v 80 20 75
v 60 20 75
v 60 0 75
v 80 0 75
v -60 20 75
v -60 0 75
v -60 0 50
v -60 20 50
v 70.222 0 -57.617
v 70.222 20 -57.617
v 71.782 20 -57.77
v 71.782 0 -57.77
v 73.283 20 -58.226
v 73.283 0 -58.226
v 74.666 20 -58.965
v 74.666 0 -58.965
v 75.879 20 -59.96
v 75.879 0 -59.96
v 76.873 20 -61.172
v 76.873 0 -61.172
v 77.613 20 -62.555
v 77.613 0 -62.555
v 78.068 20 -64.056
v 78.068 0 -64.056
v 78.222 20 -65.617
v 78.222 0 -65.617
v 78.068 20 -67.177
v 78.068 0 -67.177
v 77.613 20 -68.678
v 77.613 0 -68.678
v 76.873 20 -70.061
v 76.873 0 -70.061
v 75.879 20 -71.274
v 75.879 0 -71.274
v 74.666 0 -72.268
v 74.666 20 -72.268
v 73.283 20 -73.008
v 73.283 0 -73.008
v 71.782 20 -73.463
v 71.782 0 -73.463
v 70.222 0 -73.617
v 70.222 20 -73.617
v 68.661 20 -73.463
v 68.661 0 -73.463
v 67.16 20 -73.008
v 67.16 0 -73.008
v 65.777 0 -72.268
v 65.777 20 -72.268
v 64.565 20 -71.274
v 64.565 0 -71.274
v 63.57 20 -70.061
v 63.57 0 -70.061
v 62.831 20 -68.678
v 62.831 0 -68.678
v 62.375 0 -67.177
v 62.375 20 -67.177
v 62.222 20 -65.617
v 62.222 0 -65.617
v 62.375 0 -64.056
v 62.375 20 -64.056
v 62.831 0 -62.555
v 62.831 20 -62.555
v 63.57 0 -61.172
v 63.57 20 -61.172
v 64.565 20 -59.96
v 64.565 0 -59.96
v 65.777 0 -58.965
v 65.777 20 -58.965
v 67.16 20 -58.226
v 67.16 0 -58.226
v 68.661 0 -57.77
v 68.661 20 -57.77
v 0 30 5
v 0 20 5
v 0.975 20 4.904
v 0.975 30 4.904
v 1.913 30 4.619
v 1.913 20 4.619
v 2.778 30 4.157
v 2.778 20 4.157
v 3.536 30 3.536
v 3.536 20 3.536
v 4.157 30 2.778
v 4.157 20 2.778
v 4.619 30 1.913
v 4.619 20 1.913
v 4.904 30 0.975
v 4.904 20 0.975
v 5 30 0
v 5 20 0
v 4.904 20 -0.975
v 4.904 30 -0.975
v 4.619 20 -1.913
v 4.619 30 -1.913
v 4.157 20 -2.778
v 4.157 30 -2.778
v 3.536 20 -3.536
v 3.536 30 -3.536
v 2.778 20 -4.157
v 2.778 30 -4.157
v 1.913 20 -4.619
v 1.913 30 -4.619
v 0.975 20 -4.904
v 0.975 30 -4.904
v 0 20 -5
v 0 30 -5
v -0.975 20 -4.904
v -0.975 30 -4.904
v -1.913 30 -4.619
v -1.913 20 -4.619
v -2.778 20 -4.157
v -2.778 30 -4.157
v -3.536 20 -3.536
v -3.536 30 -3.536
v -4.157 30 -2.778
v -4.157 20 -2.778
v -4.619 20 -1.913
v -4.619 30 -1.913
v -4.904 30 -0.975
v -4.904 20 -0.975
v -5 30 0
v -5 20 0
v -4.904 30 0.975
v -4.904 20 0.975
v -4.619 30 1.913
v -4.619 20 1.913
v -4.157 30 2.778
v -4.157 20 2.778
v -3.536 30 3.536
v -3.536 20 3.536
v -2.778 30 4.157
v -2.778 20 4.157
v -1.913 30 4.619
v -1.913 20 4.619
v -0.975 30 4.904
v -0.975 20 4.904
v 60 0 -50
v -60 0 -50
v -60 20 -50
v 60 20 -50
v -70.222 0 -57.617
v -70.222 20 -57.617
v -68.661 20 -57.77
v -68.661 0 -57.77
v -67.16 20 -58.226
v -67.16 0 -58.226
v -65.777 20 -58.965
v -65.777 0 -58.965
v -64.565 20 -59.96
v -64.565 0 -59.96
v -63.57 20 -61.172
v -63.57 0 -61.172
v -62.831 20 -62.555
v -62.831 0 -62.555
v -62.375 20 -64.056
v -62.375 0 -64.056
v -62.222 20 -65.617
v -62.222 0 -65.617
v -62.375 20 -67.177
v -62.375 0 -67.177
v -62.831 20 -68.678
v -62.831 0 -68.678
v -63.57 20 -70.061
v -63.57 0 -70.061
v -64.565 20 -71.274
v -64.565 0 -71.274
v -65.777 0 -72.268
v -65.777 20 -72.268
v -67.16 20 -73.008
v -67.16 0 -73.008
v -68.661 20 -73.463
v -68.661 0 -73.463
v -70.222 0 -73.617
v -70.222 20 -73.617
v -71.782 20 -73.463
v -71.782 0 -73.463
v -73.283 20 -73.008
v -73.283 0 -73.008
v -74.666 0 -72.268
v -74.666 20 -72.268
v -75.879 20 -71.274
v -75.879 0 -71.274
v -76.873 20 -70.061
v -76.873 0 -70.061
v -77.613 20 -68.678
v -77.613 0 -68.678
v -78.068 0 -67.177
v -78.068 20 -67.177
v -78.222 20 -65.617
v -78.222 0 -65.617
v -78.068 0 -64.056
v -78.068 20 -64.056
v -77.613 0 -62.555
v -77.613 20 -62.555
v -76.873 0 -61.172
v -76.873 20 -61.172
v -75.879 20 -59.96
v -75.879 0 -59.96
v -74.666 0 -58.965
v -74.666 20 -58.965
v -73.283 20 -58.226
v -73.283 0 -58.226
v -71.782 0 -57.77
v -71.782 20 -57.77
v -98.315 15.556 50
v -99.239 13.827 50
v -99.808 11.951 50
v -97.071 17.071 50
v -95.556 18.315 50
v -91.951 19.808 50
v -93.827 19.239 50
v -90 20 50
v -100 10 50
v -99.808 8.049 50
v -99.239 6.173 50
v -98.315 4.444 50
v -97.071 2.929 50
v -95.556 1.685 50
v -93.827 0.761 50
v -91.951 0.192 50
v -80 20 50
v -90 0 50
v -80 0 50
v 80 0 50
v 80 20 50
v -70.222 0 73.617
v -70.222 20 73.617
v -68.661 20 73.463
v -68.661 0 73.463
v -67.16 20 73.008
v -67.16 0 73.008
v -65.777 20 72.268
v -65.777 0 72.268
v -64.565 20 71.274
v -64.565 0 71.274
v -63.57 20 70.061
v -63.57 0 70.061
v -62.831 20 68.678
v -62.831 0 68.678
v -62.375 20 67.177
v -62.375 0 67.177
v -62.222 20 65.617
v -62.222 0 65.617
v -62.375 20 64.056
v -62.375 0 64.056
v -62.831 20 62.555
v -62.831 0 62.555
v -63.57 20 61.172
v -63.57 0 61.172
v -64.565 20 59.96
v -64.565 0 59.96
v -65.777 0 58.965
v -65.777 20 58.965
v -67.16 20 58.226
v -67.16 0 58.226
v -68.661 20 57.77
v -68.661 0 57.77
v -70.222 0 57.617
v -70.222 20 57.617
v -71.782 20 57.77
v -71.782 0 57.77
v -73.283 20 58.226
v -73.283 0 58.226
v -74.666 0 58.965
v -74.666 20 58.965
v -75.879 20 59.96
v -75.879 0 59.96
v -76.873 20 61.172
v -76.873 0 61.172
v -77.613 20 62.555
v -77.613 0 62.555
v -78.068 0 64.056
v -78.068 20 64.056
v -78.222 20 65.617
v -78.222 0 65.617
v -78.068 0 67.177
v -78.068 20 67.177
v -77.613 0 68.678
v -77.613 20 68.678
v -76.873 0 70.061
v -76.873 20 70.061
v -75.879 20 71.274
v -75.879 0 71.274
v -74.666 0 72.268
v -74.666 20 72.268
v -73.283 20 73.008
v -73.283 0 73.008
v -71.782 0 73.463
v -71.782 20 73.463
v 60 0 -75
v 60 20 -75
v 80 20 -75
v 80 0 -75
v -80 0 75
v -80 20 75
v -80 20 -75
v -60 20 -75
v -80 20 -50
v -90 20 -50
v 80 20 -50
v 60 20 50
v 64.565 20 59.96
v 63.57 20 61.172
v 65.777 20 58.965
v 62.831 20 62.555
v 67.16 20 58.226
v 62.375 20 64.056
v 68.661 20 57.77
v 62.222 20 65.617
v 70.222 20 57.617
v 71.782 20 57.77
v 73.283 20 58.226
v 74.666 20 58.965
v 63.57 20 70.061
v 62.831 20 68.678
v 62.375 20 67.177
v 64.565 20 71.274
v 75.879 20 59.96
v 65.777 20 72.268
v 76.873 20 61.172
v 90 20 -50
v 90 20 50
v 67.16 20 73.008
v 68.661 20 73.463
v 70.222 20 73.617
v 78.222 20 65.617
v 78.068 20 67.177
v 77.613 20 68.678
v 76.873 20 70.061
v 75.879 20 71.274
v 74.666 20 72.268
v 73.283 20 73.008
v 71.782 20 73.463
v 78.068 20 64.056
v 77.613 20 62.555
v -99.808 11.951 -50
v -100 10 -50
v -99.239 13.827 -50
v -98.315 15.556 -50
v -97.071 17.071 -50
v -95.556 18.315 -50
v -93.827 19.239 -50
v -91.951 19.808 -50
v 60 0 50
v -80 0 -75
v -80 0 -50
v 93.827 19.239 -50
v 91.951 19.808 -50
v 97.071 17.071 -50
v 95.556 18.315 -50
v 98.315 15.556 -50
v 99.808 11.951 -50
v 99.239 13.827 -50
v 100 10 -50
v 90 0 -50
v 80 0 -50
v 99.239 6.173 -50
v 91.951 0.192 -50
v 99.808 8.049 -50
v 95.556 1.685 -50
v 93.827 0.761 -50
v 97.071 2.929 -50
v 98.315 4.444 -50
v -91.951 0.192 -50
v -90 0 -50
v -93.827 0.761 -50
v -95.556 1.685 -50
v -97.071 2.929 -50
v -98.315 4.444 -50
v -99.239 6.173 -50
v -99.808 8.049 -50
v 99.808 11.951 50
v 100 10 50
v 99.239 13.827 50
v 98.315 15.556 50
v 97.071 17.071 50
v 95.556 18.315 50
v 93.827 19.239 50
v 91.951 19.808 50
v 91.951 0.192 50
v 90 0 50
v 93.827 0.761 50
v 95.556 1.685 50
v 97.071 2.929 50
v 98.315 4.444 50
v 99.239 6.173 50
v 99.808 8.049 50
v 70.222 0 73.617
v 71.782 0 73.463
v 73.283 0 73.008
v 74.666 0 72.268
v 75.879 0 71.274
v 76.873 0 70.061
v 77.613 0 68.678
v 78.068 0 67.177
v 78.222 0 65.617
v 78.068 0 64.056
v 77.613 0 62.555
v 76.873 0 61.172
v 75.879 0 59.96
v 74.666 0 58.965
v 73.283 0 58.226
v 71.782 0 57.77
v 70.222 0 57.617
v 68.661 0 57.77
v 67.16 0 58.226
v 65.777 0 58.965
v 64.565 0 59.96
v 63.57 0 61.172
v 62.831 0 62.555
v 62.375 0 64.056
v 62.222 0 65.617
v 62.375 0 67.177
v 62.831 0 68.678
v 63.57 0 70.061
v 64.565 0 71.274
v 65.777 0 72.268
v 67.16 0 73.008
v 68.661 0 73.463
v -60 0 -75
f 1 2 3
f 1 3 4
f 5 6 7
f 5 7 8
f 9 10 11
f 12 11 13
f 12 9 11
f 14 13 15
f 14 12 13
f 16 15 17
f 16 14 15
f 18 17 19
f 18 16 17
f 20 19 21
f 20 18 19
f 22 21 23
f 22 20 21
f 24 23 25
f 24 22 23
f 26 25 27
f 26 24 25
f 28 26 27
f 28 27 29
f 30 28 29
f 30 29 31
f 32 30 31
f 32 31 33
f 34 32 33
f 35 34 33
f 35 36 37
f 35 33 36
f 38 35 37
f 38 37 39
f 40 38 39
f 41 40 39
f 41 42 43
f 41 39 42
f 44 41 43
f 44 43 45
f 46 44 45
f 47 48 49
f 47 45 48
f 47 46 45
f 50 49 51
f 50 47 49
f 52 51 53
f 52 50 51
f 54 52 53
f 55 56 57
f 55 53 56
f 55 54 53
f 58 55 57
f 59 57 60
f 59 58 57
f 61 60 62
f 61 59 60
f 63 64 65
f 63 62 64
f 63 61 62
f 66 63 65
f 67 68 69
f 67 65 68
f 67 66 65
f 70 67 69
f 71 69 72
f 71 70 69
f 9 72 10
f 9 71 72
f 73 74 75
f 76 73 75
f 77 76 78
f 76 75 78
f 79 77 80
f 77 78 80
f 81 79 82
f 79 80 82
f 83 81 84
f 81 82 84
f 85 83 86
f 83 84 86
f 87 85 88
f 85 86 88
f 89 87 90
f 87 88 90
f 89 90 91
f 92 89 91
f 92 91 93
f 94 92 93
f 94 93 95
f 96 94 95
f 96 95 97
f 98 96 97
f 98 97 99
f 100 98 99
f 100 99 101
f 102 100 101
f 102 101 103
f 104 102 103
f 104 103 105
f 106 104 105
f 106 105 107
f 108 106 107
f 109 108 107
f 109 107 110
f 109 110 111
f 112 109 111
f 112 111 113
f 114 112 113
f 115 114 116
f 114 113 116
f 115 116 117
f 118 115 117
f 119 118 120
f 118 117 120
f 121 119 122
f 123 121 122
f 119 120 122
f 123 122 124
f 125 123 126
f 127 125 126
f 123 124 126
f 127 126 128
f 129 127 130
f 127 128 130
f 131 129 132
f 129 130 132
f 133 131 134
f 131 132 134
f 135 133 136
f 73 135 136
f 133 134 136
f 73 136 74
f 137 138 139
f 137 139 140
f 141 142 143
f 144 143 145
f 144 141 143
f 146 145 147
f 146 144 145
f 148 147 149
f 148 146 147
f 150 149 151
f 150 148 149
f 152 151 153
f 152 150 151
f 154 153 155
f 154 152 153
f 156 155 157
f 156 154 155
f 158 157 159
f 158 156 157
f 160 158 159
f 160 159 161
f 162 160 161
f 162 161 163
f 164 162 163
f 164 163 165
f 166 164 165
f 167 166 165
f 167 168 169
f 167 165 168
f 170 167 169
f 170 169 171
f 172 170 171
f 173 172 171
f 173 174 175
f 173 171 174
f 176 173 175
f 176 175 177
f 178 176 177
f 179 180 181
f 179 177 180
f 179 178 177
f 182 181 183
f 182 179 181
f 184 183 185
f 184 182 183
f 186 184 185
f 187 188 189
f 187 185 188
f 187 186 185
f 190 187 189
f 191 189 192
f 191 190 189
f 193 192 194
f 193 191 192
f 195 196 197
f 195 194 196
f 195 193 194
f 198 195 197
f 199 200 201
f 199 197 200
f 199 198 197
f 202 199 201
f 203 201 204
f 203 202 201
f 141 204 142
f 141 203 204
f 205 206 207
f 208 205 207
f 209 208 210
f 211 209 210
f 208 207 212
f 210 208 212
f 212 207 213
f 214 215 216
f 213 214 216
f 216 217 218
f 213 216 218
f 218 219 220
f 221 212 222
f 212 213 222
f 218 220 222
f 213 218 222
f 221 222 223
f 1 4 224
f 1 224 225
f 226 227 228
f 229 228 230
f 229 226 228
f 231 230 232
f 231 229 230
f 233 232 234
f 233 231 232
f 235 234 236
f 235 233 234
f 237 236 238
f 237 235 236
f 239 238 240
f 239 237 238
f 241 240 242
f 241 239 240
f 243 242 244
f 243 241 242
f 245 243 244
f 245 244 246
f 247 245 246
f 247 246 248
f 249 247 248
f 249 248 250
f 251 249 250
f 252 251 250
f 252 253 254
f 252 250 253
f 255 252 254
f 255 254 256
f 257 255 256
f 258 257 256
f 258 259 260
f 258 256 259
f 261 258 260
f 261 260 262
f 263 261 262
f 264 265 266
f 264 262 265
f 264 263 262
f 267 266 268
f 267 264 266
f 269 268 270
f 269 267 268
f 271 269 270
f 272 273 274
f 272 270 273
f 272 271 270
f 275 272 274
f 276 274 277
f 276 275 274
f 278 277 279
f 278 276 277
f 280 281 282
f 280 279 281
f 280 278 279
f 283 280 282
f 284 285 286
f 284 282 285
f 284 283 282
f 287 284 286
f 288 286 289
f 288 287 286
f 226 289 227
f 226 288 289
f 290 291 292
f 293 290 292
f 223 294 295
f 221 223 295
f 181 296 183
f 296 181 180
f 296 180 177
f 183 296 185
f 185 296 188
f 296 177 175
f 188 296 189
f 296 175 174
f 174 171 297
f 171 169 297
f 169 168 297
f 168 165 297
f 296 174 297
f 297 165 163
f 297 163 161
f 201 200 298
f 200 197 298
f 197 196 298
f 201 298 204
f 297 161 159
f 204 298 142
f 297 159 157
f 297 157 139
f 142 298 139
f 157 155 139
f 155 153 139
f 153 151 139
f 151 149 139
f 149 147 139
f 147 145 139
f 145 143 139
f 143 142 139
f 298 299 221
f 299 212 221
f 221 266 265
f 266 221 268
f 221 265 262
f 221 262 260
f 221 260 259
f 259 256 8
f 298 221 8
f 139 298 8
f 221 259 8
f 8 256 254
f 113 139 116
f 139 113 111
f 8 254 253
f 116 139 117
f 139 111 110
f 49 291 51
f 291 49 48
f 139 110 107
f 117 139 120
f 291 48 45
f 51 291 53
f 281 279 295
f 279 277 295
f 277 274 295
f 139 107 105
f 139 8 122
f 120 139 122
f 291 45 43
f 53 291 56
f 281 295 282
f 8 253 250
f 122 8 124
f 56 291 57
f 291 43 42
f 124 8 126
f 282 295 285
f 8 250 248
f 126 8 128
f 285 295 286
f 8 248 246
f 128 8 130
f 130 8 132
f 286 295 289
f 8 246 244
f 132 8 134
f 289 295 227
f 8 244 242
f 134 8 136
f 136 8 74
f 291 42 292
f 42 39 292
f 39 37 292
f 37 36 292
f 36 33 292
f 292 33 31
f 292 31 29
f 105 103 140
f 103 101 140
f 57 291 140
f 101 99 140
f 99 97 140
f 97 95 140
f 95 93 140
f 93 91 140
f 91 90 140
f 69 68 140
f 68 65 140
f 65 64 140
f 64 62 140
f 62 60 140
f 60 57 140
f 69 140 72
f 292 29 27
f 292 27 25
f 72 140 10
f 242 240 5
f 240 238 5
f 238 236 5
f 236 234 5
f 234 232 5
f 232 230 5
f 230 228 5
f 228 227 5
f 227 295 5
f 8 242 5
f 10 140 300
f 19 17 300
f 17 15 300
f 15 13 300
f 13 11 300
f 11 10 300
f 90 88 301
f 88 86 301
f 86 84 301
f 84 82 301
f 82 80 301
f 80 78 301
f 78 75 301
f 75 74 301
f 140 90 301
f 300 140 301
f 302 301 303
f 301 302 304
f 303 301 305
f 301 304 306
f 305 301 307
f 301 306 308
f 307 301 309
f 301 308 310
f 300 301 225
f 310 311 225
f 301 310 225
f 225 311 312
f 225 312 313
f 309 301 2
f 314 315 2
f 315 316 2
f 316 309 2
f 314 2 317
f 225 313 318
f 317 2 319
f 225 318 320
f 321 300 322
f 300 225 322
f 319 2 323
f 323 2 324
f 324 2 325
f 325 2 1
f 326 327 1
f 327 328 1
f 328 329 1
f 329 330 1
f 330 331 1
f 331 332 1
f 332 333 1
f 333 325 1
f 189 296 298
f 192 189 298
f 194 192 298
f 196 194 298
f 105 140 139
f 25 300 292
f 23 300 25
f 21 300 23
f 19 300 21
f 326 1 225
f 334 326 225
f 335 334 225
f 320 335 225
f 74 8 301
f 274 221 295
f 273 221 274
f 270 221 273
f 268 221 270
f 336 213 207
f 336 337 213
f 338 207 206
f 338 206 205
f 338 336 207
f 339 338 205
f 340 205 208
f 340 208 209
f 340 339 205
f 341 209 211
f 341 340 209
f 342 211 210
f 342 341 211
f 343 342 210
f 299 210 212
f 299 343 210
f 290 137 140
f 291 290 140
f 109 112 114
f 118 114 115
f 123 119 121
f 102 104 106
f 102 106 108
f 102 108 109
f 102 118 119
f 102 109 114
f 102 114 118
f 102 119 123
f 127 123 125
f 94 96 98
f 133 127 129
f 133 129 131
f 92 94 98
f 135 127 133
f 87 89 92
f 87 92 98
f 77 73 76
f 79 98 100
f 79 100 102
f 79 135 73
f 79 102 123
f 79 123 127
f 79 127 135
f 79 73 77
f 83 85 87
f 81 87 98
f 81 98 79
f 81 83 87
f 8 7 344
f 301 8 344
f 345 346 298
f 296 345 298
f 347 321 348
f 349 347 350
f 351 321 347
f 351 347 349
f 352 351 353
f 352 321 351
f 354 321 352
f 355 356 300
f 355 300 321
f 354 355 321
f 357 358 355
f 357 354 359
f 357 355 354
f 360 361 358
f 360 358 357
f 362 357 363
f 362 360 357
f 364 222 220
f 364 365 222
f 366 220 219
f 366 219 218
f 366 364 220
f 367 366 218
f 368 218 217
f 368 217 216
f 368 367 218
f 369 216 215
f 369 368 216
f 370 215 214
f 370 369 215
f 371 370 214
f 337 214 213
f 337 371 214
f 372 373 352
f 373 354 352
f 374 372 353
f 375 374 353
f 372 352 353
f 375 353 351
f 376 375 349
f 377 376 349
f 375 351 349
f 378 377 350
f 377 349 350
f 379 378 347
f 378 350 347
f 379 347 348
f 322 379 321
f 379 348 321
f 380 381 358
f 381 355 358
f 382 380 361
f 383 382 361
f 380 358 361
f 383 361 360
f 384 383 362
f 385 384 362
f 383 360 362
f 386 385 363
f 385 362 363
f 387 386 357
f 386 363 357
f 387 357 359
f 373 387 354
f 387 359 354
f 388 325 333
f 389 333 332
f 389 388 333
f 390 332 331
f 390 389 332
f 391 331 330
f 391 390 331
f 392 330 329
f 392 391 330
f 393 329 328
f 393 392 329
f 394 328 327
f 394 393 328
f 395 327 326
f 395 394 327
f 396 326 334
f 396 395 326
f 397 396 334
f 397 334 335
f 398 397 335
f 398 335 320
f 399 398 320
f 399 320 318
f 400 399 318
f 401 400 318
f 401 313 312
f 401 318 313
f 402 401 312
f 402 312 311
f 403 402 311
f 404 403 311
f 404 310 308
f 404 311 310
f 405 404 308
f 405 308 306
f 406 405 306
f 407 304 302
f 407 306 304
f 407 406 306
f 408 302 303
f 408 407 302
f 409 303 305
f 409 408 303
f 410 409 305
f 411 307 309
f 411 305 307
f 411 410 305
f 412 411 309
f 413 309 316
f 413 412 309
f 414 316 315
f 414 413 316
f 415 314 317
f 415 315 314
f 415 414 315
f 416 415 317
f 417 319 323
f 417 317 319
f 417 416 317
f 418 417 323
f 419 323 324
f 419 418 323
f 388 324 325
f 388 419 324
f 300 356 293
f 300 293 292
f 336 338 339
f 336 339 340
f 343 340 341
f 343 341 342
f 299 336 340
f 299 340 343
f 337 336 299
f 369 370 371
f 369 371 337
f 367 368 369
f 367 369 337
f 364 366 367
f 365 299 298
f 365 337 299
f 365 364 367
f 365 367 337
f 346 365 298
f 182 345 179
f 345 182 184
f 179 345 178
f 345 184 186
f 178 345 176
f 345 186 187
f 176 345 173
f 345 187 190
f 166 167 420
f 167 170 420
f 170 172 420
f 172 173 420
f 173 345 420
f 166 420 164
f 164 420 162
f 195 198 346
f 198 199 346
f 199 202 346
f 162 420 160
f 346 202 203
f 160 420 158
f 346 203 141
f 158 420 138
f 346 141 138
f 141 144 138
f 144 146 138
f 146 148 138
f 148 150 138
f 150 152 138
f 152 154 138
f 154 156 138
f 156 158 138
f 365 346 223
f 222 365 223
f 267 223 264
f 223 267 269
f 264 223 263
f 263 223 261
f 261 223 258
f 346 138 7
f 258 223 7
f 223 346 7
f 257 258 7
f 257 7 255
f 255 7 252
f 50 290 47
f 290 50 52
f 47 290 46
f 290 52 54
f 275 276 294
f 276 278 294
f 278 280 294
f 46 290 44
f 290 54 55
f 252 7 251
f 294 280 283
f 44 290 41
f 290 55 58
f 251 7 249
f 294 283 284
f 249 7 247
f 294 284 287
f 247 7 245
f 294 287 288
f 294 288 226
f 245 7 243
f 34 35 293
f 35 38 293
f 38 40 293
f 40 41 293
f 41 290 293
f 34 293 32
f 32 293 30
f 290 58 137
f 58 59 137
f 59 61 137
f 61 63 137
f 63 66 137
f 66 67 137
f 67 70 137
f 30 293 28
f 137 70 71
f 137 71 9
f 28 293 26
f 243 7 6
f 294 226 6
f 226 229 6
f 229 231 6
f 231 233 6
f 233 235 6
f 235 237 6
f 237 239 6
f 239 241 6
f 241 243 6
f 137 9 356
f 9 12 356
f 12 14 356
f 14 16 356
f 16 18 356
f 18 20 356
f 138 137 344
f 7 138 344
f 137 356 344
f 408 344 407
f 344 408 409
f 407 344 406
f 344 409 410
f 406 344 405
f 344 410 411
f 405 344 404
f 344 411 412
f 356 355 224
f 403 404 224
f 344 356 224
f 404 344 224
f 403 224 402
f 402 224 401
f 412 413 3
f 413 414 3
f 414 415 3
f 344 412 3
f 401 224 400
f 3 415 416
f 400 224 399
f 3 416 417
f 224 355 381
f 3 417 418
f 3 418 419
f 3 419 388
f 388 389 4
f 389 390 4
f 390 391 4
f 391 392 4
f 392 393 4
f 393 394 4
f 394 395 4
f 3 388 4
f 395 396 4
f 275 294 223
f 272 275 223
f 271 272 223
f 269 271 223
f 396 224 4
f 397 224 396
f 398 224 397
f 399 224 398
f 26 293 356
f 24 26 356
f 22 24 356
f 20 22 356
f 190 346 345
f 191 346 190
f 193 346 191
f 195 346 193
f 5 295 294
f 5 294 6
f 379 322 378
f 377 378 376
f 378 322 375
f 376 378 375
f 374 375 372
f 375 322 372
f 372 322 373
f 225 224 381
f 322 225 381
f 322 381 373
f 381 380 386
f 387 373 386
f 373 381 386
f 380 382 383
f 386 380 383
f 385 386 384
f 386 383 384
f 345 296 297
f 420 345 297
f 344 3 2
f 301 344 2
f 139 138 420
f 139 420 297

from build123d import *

# Parameters (mm, degrees)
SKETCH1_W           = 200
SKETCH1_H           = 100
BOSS_EXTRUDE1_DEPTH = 20
SKETCH2_W           = 20
SKETCH2_H           = 20
BOSS_EXTRUDE2_DEPTH = 75
SKETCH3_W           = 20
SKETCH3_H           = 20
BOSS_EXTRUDE3_DEPTH = 75
SKETCH4_R           = 8
CUT_EXTRUDE1_DEPTH  = 150
SKETCH5_R           = 5
BOSS_EXTRUDE4_DEPTH = 30
FILLET3_R           = 10
FILLET4_R           = 10


with BuildPart() as part:
    # Sketch1 → Boss-Extrude1 (new body)
    with BuildSketch(Plane(origin=(0, 0, 0), x_dir=(1, 0, 0), z_dir=(0, 1, 0))):
        Rectangle(SKETCH1_W, SKETCH1_H)
    extrude(amount=BOSS_EXTRUDE1_DEPTH)

    # Sketch2 → Boss-Extrude2 (add, symmetric)
    with BuildSketch(Plane.XY):
        with Locations((-70, 10)):
            Rectangle(SKETCH2_W, SKETCH2_H)
    extrude(amount=BOSS_EXTRUDE2_DEPTH, both=True)

    # Sketch3 → Boss-Extrude3 (add, symmetric)
    with BuildSketch(Plane.XY):
        with Locations((70, 10)):
            Rectangle(SKETCH3_W, SKETCH3_H)
    extrude(amount=BOSS_EXTRUDE3_DEPTH, both=True)

    # Sketch4 → Cut-Extrude1 (cut)
    with BuildSketch(Plane(origin=(0, 0, 0), x_dir=(1, 0, 0), z_dir=(0, 1, 0))):
        with Locations(Location((-70.221727327, 65.616664793, 0), (0, 0, 270))):
            Circle(SKETCH4_R)
        with Locations(Location((70.221727327, 65.616664793, 0), (0, 0, 270))):
            Circle(SKETCH4_R)
        with Locations(Location((-70.221727327, -65.616664793, 0), (0, 0, 270))):
            Circle(SKETCH4_R)
        with Locations(Location((70.221727327, -65.616664793, 0), (0, 0, 270))):
            Circle(SKETCH4_R)
    extrude(amount=CUT_EXTRUDE1_DEPTH, mode=Mode.SUBTRACT)

    # Sketch5 → Boss-Extrude4 (add)
    with BuildSketch(Plane(origin=(0, 0, 0), x_dir=(1, 0, 0), z_dir=(0, 1, 0))):
        with Locations(Location((0, 0, 0), (0, 0, 270))):
            Circle(SKETCH5_R)
    extrude(amount=BOSS_EXTRUDE4_DEPTH)

    # Fillet3
    fillet3_edges = [part.edges().sort_by_distance(p)[0] for p in [
        (100, 0, 0),
        (100, 20, 0),
    ]]
    fillet(fillet3_edges, radius=FILLET3_R - 0.0001)  # a hair under: the kernel refuses the full size

    # Fillet4
    fillet4_edges = [part.edges().sort_by_distance(p)[0] for p in [
        (-100, 0, 0),
        (-100, 20, 0),
    ]]
    fillet(fillet4_edges, radius=FILLET4_R - 0.0001)  # a hair under: the kernel refuses the full size


solid = part.part
